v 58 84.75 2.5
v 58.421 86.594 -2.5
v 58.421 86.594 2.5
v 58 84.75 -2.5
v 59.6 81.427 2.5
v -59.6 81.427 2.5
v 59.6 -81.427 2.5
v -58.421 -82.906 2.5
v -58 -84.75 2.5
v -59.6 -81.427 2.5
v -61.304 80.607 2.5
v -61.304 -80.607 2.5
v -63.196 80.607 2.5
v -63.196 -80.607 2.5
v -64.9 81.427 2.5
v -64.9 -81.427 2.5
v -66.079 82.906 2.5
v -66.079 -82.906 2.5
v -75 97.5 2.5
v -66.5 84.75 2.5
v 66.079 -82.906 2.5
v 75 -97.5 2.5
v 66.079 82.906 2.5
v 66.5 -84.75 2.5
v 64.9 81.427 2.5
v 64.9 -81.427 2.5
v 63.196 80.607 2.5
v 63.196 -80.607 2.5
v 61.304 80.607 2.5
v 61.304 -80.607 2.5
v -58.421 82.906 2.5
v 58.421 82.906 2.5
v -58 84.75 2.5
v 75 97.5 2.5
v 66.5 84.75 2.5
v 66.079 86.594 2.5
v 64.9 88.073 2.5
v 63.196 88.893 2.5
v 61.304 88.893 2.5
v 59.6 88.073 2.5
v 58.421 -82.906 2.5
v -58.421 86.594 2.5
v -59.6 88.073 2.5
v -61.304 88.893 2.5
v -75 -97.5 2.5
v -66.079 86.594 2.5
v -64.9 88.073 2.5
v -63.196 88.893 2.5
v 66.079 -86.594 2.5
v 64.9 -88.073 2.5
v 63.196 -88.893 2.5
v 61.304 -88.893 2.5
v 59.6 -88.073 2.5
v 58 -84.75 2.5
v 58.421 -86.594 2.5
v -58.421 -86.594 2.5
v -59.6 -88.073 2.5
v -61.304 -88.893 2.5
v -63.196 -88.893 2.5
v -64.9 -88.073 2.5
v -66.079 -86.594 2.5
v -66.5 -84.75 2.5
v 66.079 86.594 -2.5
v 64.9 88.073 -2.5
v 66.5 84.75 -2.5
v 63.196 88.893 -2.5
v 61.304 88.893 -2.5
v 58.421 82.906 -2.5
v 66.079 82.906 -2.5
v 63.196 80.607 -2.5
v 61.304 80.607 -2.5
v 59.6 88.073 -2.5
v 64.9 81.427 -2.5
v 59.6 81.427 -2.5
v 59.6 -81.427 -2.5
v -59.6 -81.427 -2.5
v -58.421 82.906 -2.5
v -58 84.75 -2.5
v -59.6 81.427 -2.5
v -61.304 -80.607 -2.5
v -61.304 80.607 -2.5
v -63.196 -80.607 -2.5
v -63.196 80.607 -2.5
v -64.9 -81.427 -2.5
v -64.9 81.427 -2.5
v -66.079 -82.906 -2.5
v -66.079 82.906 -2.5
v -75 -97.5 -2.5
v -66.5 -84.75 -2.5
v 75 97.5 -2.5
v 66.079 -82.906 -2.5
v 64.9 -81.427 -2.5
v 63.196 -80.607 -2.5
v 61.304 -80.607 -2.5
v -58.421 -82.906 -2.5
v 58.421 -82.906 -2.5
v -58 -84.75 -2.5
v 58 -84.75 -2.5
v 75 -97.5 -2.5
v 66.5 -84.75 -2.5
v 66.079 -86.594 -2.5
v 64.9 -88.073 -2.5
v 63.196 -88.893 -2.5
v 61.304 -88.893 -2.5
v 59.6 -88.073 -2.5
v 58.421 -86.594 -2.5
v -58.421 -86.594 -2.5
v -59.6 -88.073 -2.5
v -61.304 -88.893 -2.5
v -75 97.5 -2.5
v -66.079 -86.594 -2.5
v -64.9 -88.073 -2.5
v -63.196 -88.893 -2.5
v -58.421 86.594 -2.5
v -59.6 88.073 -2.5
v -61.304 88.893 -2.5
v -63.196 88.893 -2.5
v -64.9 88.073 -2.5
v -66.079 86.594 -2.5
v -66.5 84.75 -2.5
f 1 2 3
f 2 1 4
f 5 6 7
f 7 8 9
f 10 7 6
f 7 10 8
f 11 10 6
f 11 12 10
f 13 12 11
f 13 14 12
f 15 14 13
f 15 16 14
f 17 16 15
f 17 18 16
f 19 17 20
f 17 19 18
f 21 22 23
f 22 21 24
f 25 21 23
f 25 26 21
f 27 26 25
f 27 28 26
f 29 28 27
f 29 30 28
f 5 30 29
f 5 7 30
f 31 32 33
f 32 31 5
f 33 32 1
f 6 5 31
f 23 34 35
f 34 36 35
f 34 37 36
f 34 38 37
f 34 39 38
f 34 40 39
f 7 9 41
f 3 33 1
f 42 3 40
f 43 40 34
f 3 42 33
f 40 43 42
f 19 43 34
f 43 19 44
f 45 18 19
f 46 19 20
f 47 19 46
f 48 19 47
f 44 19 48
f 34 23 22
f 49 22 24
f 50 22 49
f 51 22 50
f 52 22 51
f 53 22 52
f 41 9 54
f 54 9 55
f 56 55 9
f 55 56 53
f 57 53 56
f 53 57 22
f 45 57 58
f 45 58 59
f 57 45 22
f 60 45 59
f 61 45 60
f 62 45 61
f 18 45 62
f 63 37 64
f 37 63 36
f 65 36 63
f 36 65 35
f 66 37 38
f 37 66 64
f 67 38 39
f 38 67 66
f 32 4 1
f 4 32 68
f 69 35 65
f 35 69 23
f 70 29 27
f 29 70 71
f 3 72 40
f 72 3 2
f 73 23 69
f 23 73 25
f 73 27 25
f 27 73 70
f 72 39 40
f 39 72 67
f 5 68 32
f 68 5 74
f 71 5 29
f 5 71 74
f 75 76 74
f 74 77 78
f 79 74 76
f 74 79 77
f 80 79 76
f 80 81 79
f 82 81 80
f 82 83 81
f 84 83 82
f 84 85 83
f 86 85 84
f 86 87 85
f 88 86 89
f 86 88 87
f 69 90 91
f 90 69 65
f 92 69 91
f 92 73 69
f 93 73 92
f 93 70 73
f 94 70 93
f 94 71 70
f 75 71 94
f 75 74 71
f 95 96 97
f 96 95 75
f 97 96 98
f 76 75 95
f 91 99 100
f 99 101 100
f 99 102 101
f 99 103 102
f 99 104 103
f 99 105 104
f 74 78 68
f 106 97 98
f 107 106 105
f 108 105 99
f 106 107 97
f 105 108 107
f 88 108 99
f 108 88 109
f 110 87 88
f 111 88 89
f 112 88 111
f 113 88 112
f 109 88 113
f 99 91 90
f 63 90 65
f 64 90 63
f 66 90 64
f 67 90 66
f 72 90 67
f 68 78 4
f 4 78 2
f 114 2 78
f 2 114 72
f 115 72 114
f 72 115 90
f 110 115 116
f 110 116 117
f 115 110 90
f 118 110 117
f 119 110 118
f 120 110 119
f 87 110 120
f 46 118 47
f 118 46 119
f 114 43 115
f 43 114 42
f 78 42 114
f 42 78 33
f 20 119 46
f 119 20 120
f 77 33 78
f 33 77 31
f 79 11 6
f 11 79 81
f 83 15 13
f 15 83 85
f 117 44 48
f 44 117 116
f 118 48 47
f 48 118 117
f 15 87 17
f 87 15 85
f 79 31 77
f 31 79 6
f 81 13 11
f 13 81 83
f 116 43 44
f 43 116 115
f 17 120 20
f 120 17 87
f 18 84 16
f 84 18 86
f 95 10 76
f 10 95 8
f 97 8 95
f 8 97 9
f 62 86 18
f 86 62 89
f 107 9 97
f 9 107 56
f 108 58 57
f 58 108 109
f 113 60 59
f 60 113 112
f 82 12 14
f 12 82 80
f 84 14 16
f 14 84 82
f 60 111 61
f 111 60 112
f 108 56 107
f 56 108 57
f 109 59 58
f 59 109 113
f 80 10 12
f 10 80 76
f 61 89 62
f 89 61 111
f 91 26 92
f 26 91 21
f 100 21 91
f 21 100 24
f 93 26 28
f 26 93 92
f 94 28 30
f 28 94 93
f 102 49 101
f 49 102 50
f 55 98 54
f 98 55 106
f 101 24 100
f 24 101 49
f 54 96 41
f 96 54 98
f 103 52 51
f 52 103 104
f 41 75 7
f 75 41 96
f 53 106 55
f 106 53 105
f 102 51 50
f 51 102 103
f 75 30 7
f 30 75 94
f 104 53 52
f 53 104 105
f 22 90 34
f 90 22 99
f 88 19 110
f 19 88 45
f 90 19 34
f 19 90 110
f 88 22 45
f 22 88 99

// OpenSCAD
// Generated by SolidPython 1.1.3 on 2024-07-25 13:19:41


difference() {
	cube(center = true, size = [150, 195.0000000000, 5]);
	union() {
		translate(v = [62.2500000000, 84.7500000000]) {
			cylinder(center = true, h = 5, r = 4.2500000000);
		}
		translate(v = [-62.2500000000, 84.7500000000]) {
			cylinder(center = true, h = 5, r = 4.2500000000);
		}
		translate(v = [-62.2500000000, -84.7500000000]) {
			cylinder(center = true, h = 5, r = 4.2500000000);
		}
		translate(v = [62.2500000000, -84.7500000000]) {
			cylinder(center = true, h = 5, r = 4.2500000000);
		}
	}
}
/***********************************************
*********      SolidPython code:      **********
************************************************
 
import solid
import numpy as np
import numbers
import pudb
from solid.utils import *
import viewscad
import subprocess
import os
import os.path as osp
import math
import sys

chamfer_extrude=solid.import_scad("./chamfer_extrude.scad")
chamfer_extrude=chamfer_extrude.chamfer_extrude
r = viewscad.Renderer(width=800, height=800)

def debug(model,f_name,path="/home/ts/code/projects/mfd/designs/debug"):
    solid.scad_render_to_file(model,osp.join(path,f_name)+".scad")
#generate position list of wells using offset from center
wells_pos_from_center_4 = lambda offset: [[-offset,offset],
                                        [offset, offset],
                                        [-offset, -offset],
                                        [offset, -offset]]
wells_pos_from_center_2 = lambda offset: [[offset,0],
                                        [-offset,0]]

def make_well(dims,shape=None,height=None,dxf=False):
    def circle_cylinder():
        if dxf or (height is None):
            well = solid.circle(r=dims, segments=64)
        else:
            well = solid.cylinder(r=dims, h=height, segments=64, center = True)
        return well
    if dims is None:
        sys.exit("radius needs to be a number")
    if isinstance(dims, numbers.Number):
        well =circle_cylinder()
    elif len(dims)==1:
        if isinstance(dims[1], numbers.Number):
            well =circle_cylinder()
        else:
            sys.exit("radius needs to be a number")
    elif len(dims)==2:
        well = solid.square(dims,center = True)
    elif len(dims)==3:
        well = solid.cube(dims, center = True)
    return well

def wells_top_bottom(center_gap,device_dims=None,shape=None,height=None, positions = None, dxf = False,well_shape=None):
    if well_shape == None:
        well_shape = make_well(device_dims,shape=shape,height=height,dxf=dxf)
    wells = []
    if positions is None:
        offset = radius+radius/2.0
        positions = wells_pos_from_center_2(offset)
    if dxf or (height is None):
        height = 0
    for position in positions:
        if dxf:
            wells.append(solid.translate([position[0],position[1]])(well_shape))
        else:
            wells.append(solid.translate([position[0],position[1],height/2.0])(well_shape))
    return  union()(*wells)

#place wells in four corners 
def four_corner(radius,height=None, positions = None, dxf = False):
    #if well pos not specified set
    #to equally spaced by half radius
    if positions is None:
        offset = radius+radius/2.0
        positions = wells_pos_from_center_4(offset)
    if dxf or (height is None):
        height = 0
    #make wells at positions with specified radius and height
    wells = []
    for position in positions:
        #make circle if making dxf
        if dxf:
            well_shape = solid.circle(r=radius, segments=64)
            well_shape = solid.translate([position[0],position[1]])(well_shape)
        #if stl make cylinder
        else:
            well_shape = solid.cylinder(r=radius, h=height, segments=64, center = True)
            well_shape = solid.translate([position[0],position[1],height/2.0])(well_shape)
        wells.append(well_shape)
    return  union()(*wells)

#generate channels 
def make_channels(length,width,height=0,num_chans=1,max_chans=None,spacing=None, dxf = False,
                  rotate_channels=False):
    if dxf or (height is None):
        height = 0
    #if channel gap not defined, is equal to
    if spacing is None: spacing = width
    #calculate number of channels if fitting max num within given width
    if not max_chans is None:
        import math
        num_chans = math.floor((max_chans-spacing)/(width+spacing))
    #get total width of channel section  
    total_width = (width*num_chans)+(spacing*(num_chans-1))

    #make template channel
    #if rotate_channels: width, length = length, width
    if dxf:
        channel_t = solid.square([length,width],center = True)
    else:
        channel_t = solid.cube([length,width,height], center = True)

    #if number channels is even, offset the first channel to center its gap
    if num_chans % 2 == 0: centering = -(width/2.0+spacing/2.0)
    else: centering = 0
    #move template channel up to align bottom at z = 0 
    #and offset center if necessary
    if dxf:
        channel_t = solid.translate([0,centering])(channel_t)
    else:
        channel_t = solid.translate([0,centering,height/2.0])(channel_t)

    #if rotate_channels: length,width = width,length
    #start making the channels
    channels = []
    for i in range(num_chans):
        #if i=0 there is no translation
        #if i=1, we make the first channel adjacent to second
        direction = i

        #if i>=1, we add channels alternating left and right
        if i >= 1:
            direction = -(i/2.0)
            if i % 2 == 1: direction = (-direction)+0.5
                
        #make channel at right position and add it to channel list
        translation_coords = [0,direction*(width+spacing)]
        #if rotate_channels: translation_coords = [direction*(width+spacing),0]
        if dxf:
            channel = solid.translate(translation_coords)(channel_t)
        else:
            channel = solid.translate([*translation_coords,0])(channel_t)
        channels.append(channel)
    
    #group all channels as one object
    channels = union()(*channels)
    #compute the x,y,z dimensions in order to pass as arguments 
    #for construction of other parts of device (such as the chambers)
    measurements = {'x':(length/2.0,-length/2.0),
                    'y':(total_width/2.0,-total_width/2.0)}
    if not dxf:
        measurements['z'] = (height,0)
    if rotate_channels:
        channels = solid.rotate(90)(channels)
        measurements['x'],measurements['y']=measurements['y'],measurements['x']
    return channels,measurements

def make_chambers(msrs,height=None,extra=0,len_until=None,width=None, dxf = False):
    #computes x,y,z length
    total = lambda x : abs(x[0]) + abs(x[1])
    
    #if specific height if specified
    #otherwise use same height as channels
    if dxf:
        pass
    elif not height is None:
        msrs['z'] = (height,0)
    else:
        msrs['z'] = (0,0)
        
    #make copy of measurements from channels to modify chamber dimensions 
    #and add length to chambers as specified
    chamber_dims = msrs.copy()
    #calculate length of chamber to reach specified offset
    if not len_until is None:
        chamber_len = len_until-(msrs['x'][0])
    #or add specified length to channel length (if not specified, adds 0)
    else:
        chamber_len = msrs['x'][0]+extra
    #set the chamber length based 
    chamber_dims['x'] = (chamber_len/2.0,-(chamber_len/2.0))
    #compute final dimensions of chamber
    if not width is None:
        chamber_dims['y'] = (width/2.0,-width/2.0)
    chamber_dims = [total(size) for size in chamber_dims.values()]
        
    #calculate chamber translation offset to place adjacent to channels
    chamber_trslt = msrs['x'][0]+(chamber_len/2.0)
    #compute chamber translation coordinates to align with channels
    #x = 1 moves chamber above channels
    #x = -1 moves chamber below channels
    if dxf:
        trslt = lambda x : [x*(chamber_trslt),0]
    else:
        trslt = lambda x : [x*(chamber_trslt),0,msrs['z'][0]/2.0]
    
    #function to make chamber at top or at bottom 
    if dxf:
        move = lambda x : solid.translate(trslt(x))(solid.square(chamber_dims, center = True) )
    else:
        move = lambda x : solid.translate(trslt(x))(solid.cube(chamber_dims,center = True))
    #make top and bottom chambers and return them as grouped
    top = move(1)
    bottom = move(-1)
    #chambers=solid.rotate(90)(solid.union()(top,bottom))
    chambers=(solid.union()(top,bottom))

    return chambers

#create alignment features 
def alignment_features(unit,dims,grid_size, mask_size = None, alignment = "hollow", units_from_center = (2.5,2.5), corner_len=None):
    width = grid_size[0]*dims[0]
    length = grid_size[1]*dims[1]
    if mask_size is None and corner_len is None:
        corner_len = (dims[0] + dims[1]) /2 / 8
    corner = lambda thickness_div : solid.union()( solid.square([corner_len,corner_len/thickness_div],center=False), solid.square([corner_len/thickness_div,corner_len],center=False) )
    
    def make_full(thickness_div):
        thickness = corner_len/thickness_div
        tr = solid.translate([0, 0, 0 ])(solid.rotate(180)(corner(thickness_div)))
        tr = solid.translate([thickness/2,thickness/2,0])(tr)
        bl = solid.translate([0, 0, 0 ])(solid.rotate(0)(corner(thickness_div)))
        bl = solid.translate([-thickness/2,-thickness/2,0])(bl)
        return solid.union()(tr,bl)
    
    def make_hollow(thickness_div):
        thickness = corner_len/(thickness_div/2)
        inner = make_full(thickness_div)
        outer = make_full(thickness_div/2)
        hollow = outer - inner 
        return hollow
    
    center = (width /2 , length/2)
    mask_pos = lambda x,y : (center[0] + x*(float(units_from_center[0])*dims[0]), center[1] + y*(float(units_from_center[1])*dims[1]))
    positions = []
    positions.append(mask_pos(1,0))
    positions.append(mask_pos(0,1))
    positions.append(mask_pos(-1,0))
    positions.append(mask_pos(0,-1))
    make_mask = lambda mtype : make_hollow(8) if mtype == "hollow" else make_full(8)
    masks = [ solid.translate([*position,0])(make_mask(alignment)) for position in positions]
    
    solid.scad_render_to_file(solid.union()(*masks),"./designs/open_chamber/masks.scad")
    #return unit - solid.union()(*masks)
    return solid.union()(*masks,unit)

def create_outline(thickness, array, dims, grid_size,):
    width = grid_size[0]*dims[0] + thickness *2
    length = grid_size[1]*dims[1] + thickness *2
    outer = solid.translate([-thickness, -thickness,0])(solid.square([width, length]))
    return outer-array

def create_wall(wall_thickness, outline_thickness, dims, grid_size, wall_height = 2000, dxf = False):
    inner_width = grid_size[0]*dims[0] + outline_thickness *2
    inner_length = grid_size[1]*dims[1] + outline_thickness *2
    outer_width = inner_width + wall_thickness * 2
    outer_length = inner_length + wall_thickness * 2
    outer_pos_x = -outline_thickness-wall_thickness
    outer_pos_y = -outline_thickness-wall_thickness
    inner_pos_x = -outline_thickness
    inner_pos_y = -outline_thickness
    if dxf:
        inner_wall = solid.translate([inner_pos_x,
                                      inner_pos_y,
                                      0])(solid.square([inner_width, inner_length]))
        outer_wall = solid.translate([outer_pos_x,
                                      outer_pos_y,
                                      0])(solid.square([outer_width, outer_length]))

        return outer_wall-inner_wall
    else:
        inner_wall = solid.translate([inner_pos_x,
                                      inner_pos_y,
                                      0])(solid.cube([inner_width, inner_length,wall_height]))
        outer_wall = solid.translate([outer_pos_x,
                                      outer_pos_y,
                                      0])(solid.cube([outer_width, outer_length,wall_height]))

        return outer_wall-inner_wall, {'wall_height': wall_height,
                                       'wall_thickness': wall_thickness,
                                       'inner_width':inner_width,
                                       'inner_length': inner_length,
                                       'outer_width': outer_width,
                                       'outer_length': outer_length,
                                       'outer_pos_x' : outer_pos_x,
                                       'outer_pos_y' : outer_pos_y,
                                       'inner_pos_x' : inner_pos_x,
                                       'inner_pos_y' : inner_pos_y}

def create_thicker_wall(wall_thickness, outer_wall_offset, wall_dims, dims, grid_size, height_start = .2, height_end=2, dxf = False):
    addon_wall,thicker_wall_dims = create_wall(wall_thickness, outer_wall_offset, dims, grid_size, wall_height=height_end-height_start, dxf = False)
    addon_wall = solid.translate([0,0,height_start])(addon_wall)

    thicker_wall_dims['wall_height'] = height_end
    thicker_wall_dims['wall_thickness'] = wall_dims['wall_thickness'] + wall_thickness
    return addon_wall, thicker_wall_dims
 
def add_lock_to_wall(wall,wall_dims,y_offset = 0,cut_ratio=0.7,L_length=3, gap_ratio=0.05, axis="x",width_ratio=1/2):
    # Makes L shape
    def make_L(max_length,length_thickness,max_width,width_thickness,height,y_offset):
        length = solid.cube([max_length,length_thickness,height])
        width = solid.cube([width_thickness,max_width,height])
        width = solid.translate([max_length-(width_thickness),0,0])(width)
        L = solid.union()(width,length)
        debug(L,"L")
        if axis == "x":
            L = solid.rotate(-90)(L)
            L = solid.translate([0,max_length,0])(L)
        else:
            L = solid.rotate(-180)(L)
            L = solid.translate([max_length,max_width,0])(L)
        return solid.translate([0,0,y_offset])(L)
    
    lock_length = L_length
    lock_width = wall_dims['wall_thickness']*width_ratio
    lock_length_thickness = lock_width/2
    lock_width_thickness = lock_width/2
    L_lock = make_L(lock_length,lock_length_thickness,lock_width,lock_width_thickness, wall_dims['wall_height']-y_offset, y_offset)
    
    margin_space = lock_length - lock_length*(1-gap_ratio)
    key_length = lock_length-margin_space
    key_length_thickness = lock_length_thickness-(margin_space*2)
    key_width = lock_width-(margin_space*2)
    key_width_thickness = lock_width_thickness-(margin_space*2)
    L_key = make_L(key_length,key_length_thickness,key_width,key_width_thickness, wall_dims['wall_height']-y_offset, y_offset)
    L_key = solid.translate([margin_space,margin_space,0])(L_key)
    L = solid.union()(L_lock,L_key)
    debug(L,"L")
    
    #Make cube to be used as negative to split frame in a half
    #Can choose if making left or right negative, specify ratio of split
    def make_negative(right,cut_ratio):
        if axis == "x":
            if right:
                length = wall_dims['outer_length']*(1-cut_ratio)
                pos_x = wall_dims['outer_pos_x']+(wall_dims['outer_length']*cut_ratio)
            else:
                length = wall_dims['outer_length']*(cut_ratio)
                pos_x = wall_dims['outer_pos_x'] 
            negative = solid.cube([wall_dims['outer_width'],length, wall_dims['wall_height']])
            negative = solid.translate([wall_dims['outer_pos_y'],pos_x,0])(negative)
        else:
            if right:
                length = wall_dims['outer_width']*(1-cut_ratio)
                pos_x = wall_dims['outer_pos_y']+(wall_dims['outer_width']*cut_ratio)
            else:
                length = wall_dims['outer_width']*(cut_ratio)
                pos_x = wall_dims['outer_pos_y'] 
            negative = solid.cube([length,wall_dims['outer_length'], wall_dims['wall_height']])
            negative = solid.translate([pos_x,wall_dims['outer_pos_x'],0])(negative)
        return negative, pos_x, length 
                      
    #Make negatives
    negative_right, right_half_pos_x, right_half_length = make_negative(True,cut_ratio)
    negative_left, left_half_pos_x, right_half_length = make_negative(False,cut_ratio)
    #Make halves
    left_half = solid.difference()(wall,negative_right)
    right_half = solid.difference()(wall,negative_left)
    def place_L(L, L_length,L_width):
        #Place L on top wall       
        offset_to_center = (wall_dims['wall_thickness']-L_width)/2
        if axis == "x":
            y_pos_top = (wall_dims['outer_pos_y'] +
                    wall_dims['outer_width'] - 
                    L_width - offset_to_center)
            top_L = solid.translate([y_pos_top,
                                     right_half_pos_x-(L_length),
                                     0])(L)
            #Place L on bottom wall       
            y_pos_bottom = wall_dims['outer_pos_y']+offset_to_center
            bottom_L = solid.translate([y_pos_bottom,
                                        right_half_pos_x-L_length,
                                        0])(L)
        else:
            y_pos_top = (wall_dims['outer_pos_x'] +
                    wall_dims['outer_length'] -
                    (L_width+offset_to_center))
            top_L = solid.translate([right_half_pos_x-L_length,
                                     y_pos_top,
                                     0])(L)
            #Place L on bottom wall       
            y_pos_bottom = wall_dims['outer_pos_y']+offset_to_center
            bottom_L = solid.translate([right_half_pos_x-L_length,
                                        y_pos_bottom,
                                        0])(L)
        return bottom_L, top_L
    #Make complimentary L pieces through union and differences
    #Make Lock
    bottom_L_lock, top_L_lock = place_L(L_lock,L_length,lock_width)
    left_half = solid.difference()(left_half,bottom_L_lock)
    left_half = solid.difference()(left_half,top_L_lock)
    #Make Key
    bottom_L_key, top_L_key = place_L(L_key,L_length,lock_width)
    right_half = solid.union()(right_half,bottom_L_key)
    right_half = solid.union()(right_half,top_L_key)
    return left_half, right_half


#build a row x col grid of containment units
def make_unit_array(unit,dims,grid_size, dxf = False, alignment = None, mask_size = None,
                    units_from_center = None,alignment_offset=None, alignment_mark_size=1):
    units = []
    for col in range(grid_size[1]):
        for row in range(grid_size[0]):
            if dxf:
                units.append(solid.translate([row*dims[0],col*dims[1]])(unit))
            else:
                units.append(solid.translate([row*dims[0],col*dims[1],dims[2]/2.0])(unit))
    array = solid.union()(*units)
    if (not alignment is None) and dxf:
        if not alignment_offset is None:
            array = solid.translate([alignment_offset[0],alignment_offset[1]])(array)
        array = alignment_features(array,dims, grid_size, alignment = alignment, mask_size = None, units_from_center = units_from_center,corner_len=alignment_mark_size)
        if not alignment_offset is None:
            array = solid.translate([-alignment_offset[0],-alignment_offset[1]])(array)
    return array


def make_taylor(wells_pos = wells_pos_from_center_4(2.25), well_rad = 1.5 ,
                well_height = 2, chan_w = 0.01, chan_l = 1, chan_h = 0.010 ,
                chan_gap = 0.040, max_chans = None,num_chans=100, chamber_height  = 0.100,
                columns = 1, rows = 1, chamber_len_until=2.25, add_channels = True, add_wells = True, 
                add_chambers = True, save_path = "./", alignment = None, units_from_center = 2,
                mask_size = None, render_stl = False, outline_thickness = 0.050, dxf = True,
                wall_height = 15, wall_thickness = 0.95, casing_x=9, casing_y=9, casing_z=0,rotate_units=0):

    dims = [casing_x, casing_y, casing_z]
    wells = four_corner(well_rad,well_height, dxf = dxf, positions = wells_pos)
    debug(wells,"wells")
    channels, msrs = make_channels(chan_l,chan_w,chan_h,dxf=dxf, spacing = chan_gap, max_chans=max_chans,num_chans=num_chans)
    debug(channels,"channels")
    chambers = make_chambers(msrs,dxf = dxf, height=chamber_height,len_until=chamber_len_until)
    debug(chambers,"chambers")

    #add together and render
    device_parts = []
    if add_channels:
        device_parts.append(channels)
    if add_wells:
        device_parts.append(wells)
    if add_chambers:
        device_parts.append(chambers)
    device=union()(*device_parts)
    device = rotate(rotate_units)(device)

    device=solid.translate([dims[0]/2.0,dims[1]/2.0,0])(device)
    channels = rotate(rotate_units)(channels)
    channels=solid.translate([dims[0]/2,dims[1]/2,0])(channels)
    chambers_wells = union()(wells,chambers)
    chambers_wells = rotate(rotate_units)(chambers_wells)
    chambers_wells=solid.translate([dims[0]/2,dims[1]/2,0])(chambers_wells)

    file_name = str(rows)+'x'+str(columns)+'_units_'
    grid_size = [rows,columns]

    if alignment:
        alignment="full"
    device = make_unit_array(device,dims,grid_size, dxf=dxf, alignment = alignment,
                                 units_from_center = units_from_center)
    channels = make_unit_array(channels,dims,grid_size, dxf=dxf, alignment = alignment,
                                 units_from_center = units_from_center)
    if alignment=="full":
        alignment="hollow"

    chambers_wells = make_unit_array(chambers_wells,dims,grid_size, dxf=dxf, alignment = alignment,
                                 units_from_center =units_from_center)

    def save_model(model,prefix):
        model_fname = os.path.abspath(save_path+prefix+"_"+file_name+".scad")
        solid.scad_render_to_file(model,model_fname)
        return model_fname

    wells_fname = save_model(wells,"wells")
    channels_fname = save_model(channels,"channels")
    device_fname = save_model(device,"device")
    chambers_wells_fname = save_model(chambers_wells,"chambers_wells")
    return (chambers_wells,chambers_wells_fname), (channels,channels_fname), (device,device_fname)

def make_device(design='open',rows=8,columns=6,wells_pos = 4.5,well_offset=3.2, well_rad=3.2,well_height=0.1,
                chan_l=1,chan_w=0.01,chan_h=0.01,chan_gap=0.015,num_chans=101,dxf=True,save_path="./designs/open_chamber/",
                casing_x=9.0,casing_y=18.0,casing_z=0,rotate_units=90,units_from_center=(3,1),chamber_len_until=4.5,
                chamber_width=None,alignment=True, add_wells=True, add_channels=True,add_chambers=True,well_shape=None):

    dims = [casing_x, casing_y, casing_z]
    if design == "open":
        wells_pos=wells_pos_from_center_2(wells_pos)
        wells = wells_top_bottom(well_offset*2,device_dims=well_rad,height=well_height, dxf = dxf, positions = wells_pos,well_shape=well_shape)
    elif design == "closed":
        wells_pos=wells_pos_from_center_4(wells_pos)
        debug(wells,"wells")
        wells = four_corner(well_offset,well_height,device_dims=well_rad, dxf = dxf, positions = wells_pos)
    else:
        print(design+" is not a valid design.\n Choose valid design: 'open' or 'closed'")
        exit()
    wells = rotate(rotate_units)(wells)
    wells=solid.translate([dims[0]/2,dims[1]/2,0])(wells)
    debug(wells,"wells")

    channels, msrs = make_channels(chan_l,chan_w,chan_h,dxf=dxf, spacing = chan_gap, num_chans=num_chans,rotate_channels=False)
    channels = rotate(rotate_units)(channels)
    channels=solid.translate([dims[0]/2,dims[1]/2,0])(channels)

    chambers=make_chambers(msrs,height=None,extra=0,len_until=chamber_len_until, width=chamber_width,dxf = dxf)
    chambers = rotate(rotate_units)(chambers)
    chambers=solid.translate([dims[0]/2,dims[1]/2,0])(chambers)

    device_parts = []
    if add_channels:
        device_parts.append(channels)
    if add_wells:
        device_parts.append(wells)
    if add_chambers:
        device_parts.append(chambers)
    device = union()(*device_parts)
    #device = rotate(rotate_units)(device)
    #device=solid.translate([dims[0]/2.0,dims[1]/2.0,0])(device)

    chambers_wells = []
    if add_chambers:
        chambers_wells.append(chambers)
    if add_wells:
        chambers_wells.append(wells)
    chambers_wells = union()(*chambers_wells)
    #chambers_wells = union()(wells,chambers)
    #chambers_wells = rotate(rotate_units)(chambers_wells)
    #chambers_wells=solid.translate([dims[0]/2,dims[1]/2,0])(chambers_wells)

    file_name = str(rows)+'x'+str(columns)+'_units_'

    grid_size = [rows,columns]
    if alignment:
        alignment="full"
    device = make_unit_array(device,dims,grid_size, dxf=dxf, alignment = alignment,
                                 units_from_center = units_from_center)
    channels = make_unit_array(channels,dims,grid_size, dxf=dxf, alignment = alignment,
                                 units_from_center = units_from_center)
    if alignment=="full":
        alignment="hollow"

    chambers_wells = make_unit_array(chambers_wells,dims,grid_size, dxf=dxf, alignment = alignment,
                                 units_from_center =units_from_center)

    def save_model(model,prefix):
        model_fname = os.path.abspath(save_path+prefix+"_"+file_name+".scad")
        solid.scad_render_to_file(model,model_fname)
        return model_fname

    wells_fname = save_model(wells,"wells")
    channels_fname = save_model(channels,"channels")
    device_fname = save_model(device,"device")
    chambers_wells_fname = save_model(chambers_wells,"chambers_wells")
    return (chambers_wells,chambers_wells_fname), (channels,channels_fname), (device,device_fname)


def make_open_chamber(rows=8,columns=6,wells_pos = wells_pos_from_center_2(4.5), well_rad=3.2,well_height=0.1,
                      chan_l=1,chan_w=0.01,chan_h=0.01,chan_gap=0.015,num_chans=101,dxf=True,save_path="./designs/open_chamber/",
                      casing_x=9.0,casing_y=18.0,casing_z=0,rotate_units=90,units_from_center=(3,1),chamber_len_until=4.5,
                      chamber_width=None,alignment=True, add_wells=True, add_channels=True,add_chambers=True,well_shape=None):

    dims = [casing_x, casing_y, casing_z]
    wells = wells_top_bottom(well_rad,height=well_height, dxf = dxf, positions = wells_pos, well_shape=well_shape)
    channels, msrs = make_channels(chan_l,chan_w,chan_h,dxf=dxf, spacing = chan_gap, num_chans=num_chans,rotate_channels=False)
    chambers=make_chambers(msrs,height=None,extra=0,len_until=chamber_len_until, width=chamber_width,dxf = dxf)
    debug(chambers,"chambers")
    device_parts = []
    if add_channels:
        device_parts.append(channels)
    if add_wells:
        device_parts.append(wells)
    if add_chambers:
        device_parts.append(chambers)
    device = union()(*device_parts)
    device = rotate(rotate_units)(device)
    device=solid.translate([dims[0]/2.0,dims[1]/2.0,0])(device)
    channels = rotate(rotate_units)(channels)
    channels=solid.translate([dims[0]/2,dims[1]/2,0])(channels)
    chambers_wells = union()(wells,chambers)
    chambers_wells = rotate(rotate_units)(chambers_wells)
    chambers_wells=solid.translate([dims[0]/2,dims[1]/2,0])(chambers_wells)

    file_name = str(rows)+'x'+str(columns)+'_units_'

    grid_size = [rows,columns]
    if alignment:
        alignment="full"
    device = make_unit_array(device,dims,grid_size, dxf=dxf, alignment = alignment,
                                 units_from_center = units_from_center)
    channels = make_unit_array(channels,dims,grid_size, dxf=dxf, alignment = alignment,
                                 units_from_center = units_from_center)
    if alignment=="full":
        alignment="hollow"

    chambers_wells = make_unit_array(chambers_wells,dims,grid_size, dxf=dxf, alignment = alignment,
                                 units_from_center =units_from_center)

    def save_model(model,prefix):
        model_fname = os.path.abspath(save_path+prefix+"_"+file_name+".scad")
        solid.scad_render_to_file(model,model_fname)
        return model_fname

    wells_fname = save_model(wells,"wells")
    channels_fname = save_model(channels,"channels")
    device_fname = save_model(device,"device")
    chambers_wells_fname = save_model(chambers_wells,"chambers_wells")
    return (chambers_wells,chambers_wells_fname), (channels,channels_fname), (device,device_fname)

def to_dxf(scad_path):
    dxf_path = scad_path.replace(".scad",".dxf")
    subprocess.call(["openscad", "-o", dxf_path, scad_path])
    import ezdxf
    temp_dxf = ezdxf.readfile(dxf_path)
    temp_dxf.saveas(dxf_path)

#def make_walls(diameter,thickness,grid_size,dims,height=20,segments=256,make_inner=True):
#    wafer_wall_out = solid.cylinder(r=diameter/2,h=height, segments=segments)
#    wafer_wall_in = solid.cylinder(r=(diameter/2-thickness),h=height, segments=segments)
#    wafer_wall = solid.difference()(wafer_wall_out,wafer_wall_in)
#    wafer_wall = solid.translate([grid_size[1]*dims[1]/2.0,grid_size[0]*dims[0]/2.0])(wafer_wall)
#
#    vertical_wall_length = grid_size[1]*dims[1]
#    horizontal_wall_length = grid_size[0]*dims[0]
#    vertical_wall = solid.cube([vertical_wall_length,thickness,height],center = True)
#    vertical_wall = solid.translate([vertical_wall_length/2,0,height/2])(vertical_wall)
#    horizontal_wall = solid.cube([thickness,horizontal_wall_length,height],center = True)
#    horizontal_wall = solid.translate([0,vertical_wall_length/2,height/2])(horizontal_wall)
#    walls = []
#    walls.append(horizontal_wall)
#    walls.append(vertical_wall)
#    for col in range(grid_size[1]):
#        if col == grid_size[1]-1: 
#            walls.append(solid.translate([0,(col+1)*dims[1]])(vertical_wall))
#        elif col > 0 and col < grid_size[1]-1 and make_inner==True:
#            walls.append(solid.translate([0,(col+1)*dims[1]])(vertical_wall))
#    for row in range(grid_size[0]):
#        if row == grid_size[0]-1: 
#            walls.append(solid.translate([(row+1)*dims[0],0])(horizontal_wall))
#        elif row > 0 and row < grid_size[0]-1 and make_inner==True:
#            walls.append(solid.translate([(row+1)*dims[0],0])(horizontal_wall))
#    walls = union()(*walls)
#    wafer_walls = union()(walls,wafer_wall)
#    return walls,wafer_wall,wafer_walls

def make_walls(diameter,thickness,grid_size,dims,height=20,segments=256,make_inner=True,padx=0,pady=0):
    wafer_wall_out = solid.cylinder(r=diameter/2,h=height, segments=segments)
    wafer_wall_in = solid.cylinder(r=(diameter/2-thickness),h=height, segments=segments)
    wafer_wall = solid.difference()(wafer_wall_out,wafer_wall_in)
    wafer_wall = solid.translate([grid_size[1]*dims[1]/2.0,grid_size[0]*dims[0]/2.0])(wafer_wall)

    vertical_wall_length = grid_size[0]*dims[0]+padx
    horizontal_wall_length = grid_size[1]*dims[1]+pady
    vertical_wall = solid.cube([vertical_wall_length,thickness,height],center = True)
    vertical_wall = solid.translate([vertical_wall_length/2-pady/2,-padx/2,height/2])(vertical_wall)
    horizontal_wall = solid.cube([thickness,horizontal_wall_length,height],center = True)
    horizontal_wall = solid.translate([-pady/2,horizontal_wall_length/2-padx/2,height/2])(horizontal_wall)
    walls = []
    walls.append(horizontal_wall)
    walls.append(vertical_wall)
    for col in range(grid_size[1]):
        if col == grid_size[1]-1: 
            walls.append(solid.translate([0,(col+1)*dims[1]+pady])(vertical_wall))
        elif col > 0 and col < grid_size[1]-1 and make_inner==True:
            walls.append(solid.translate([0,(col+1)*dims[1]])(vertical_wall))
    for row in range(grid_size[0]):
        if row == grid_size[0]-1: 
            walls.append(solid.translate([(row+1)*dims[0]+padx,0])(horizontal_wall))
        elif row > 0 and row < grid_size[0]-1 and make_inner==True:
            walls.append(solid.translate([(row+1)*dims[0],0])(horizontal_wall))
    walls = union()(*walls)
    wafer_walls = union()(walls,wafer_wall)
    return walls,wafer_wall,wafer_walls

def save_model(model,base_path,base_name,dxf=True):
    if not os.path.exists(base_path):
        os.makedirs(base_path)
    dxf_path=osp.join(base_path,base_name+".scad")
    solid.scad_render_to_file(model,osp.join(dxf_path))
    if dxf:
        to_dxf(dxf_path)

def make_wafer(diameter,flat_len,thickness):
    wafer = solid.cylinder(r1=diameter/2,r2=diameter/2,h=thickness,segments=512,)()
    x_start_flat=(flat_len/2)
    y_start_flat = math.sqrt(((diameter/2)**2) - (x_start_flat**2) )
    height_delete_flat=diameter/2-y_start_flat
    flat_delete = solid.cube([flat_len,height_delete_flat,thickness],center=False)()
    flat_delete = solid.translate([-flat_len/2,y_start_flat,0])(flat_delete)
    wafer = solid.difference()(wafer,flat_delete)
    wafer = solid.rotate(90)(wafer)
    return wafer

def add_wafer_to_mask(wafer_size,flat_len,mask,grid_size,dims,wafer_line_thickness=0.1,outer_mask_thickness=5,alignment_offset=None,shrinkage_scale=1.0):
    def make_wafer_mask(wafer_size,flat_len):
        wafer_mask = make_wafer(wafer_size,flat_len,1)
        wafer_mask = solid.projection()(wafer_mask)
        wafer_mask = solid.translate(np.array([grid_size[0]*dims[0]/2.0,grid_size[1]*dims[1]/2.0])*shrinkage_scale)(wafer_mask)
        if not alignment_offset is None:
            wafer_mask = solid.translate(np.array([-alignment_offset[0],-alignment_offset[1]])*shrinkage_scale)(wafer_mask)
        return wafer_mask

    inner_wafer_line_mask = make_wafer_mask(wafer_size-wafer_line_thickness/2,flat_len)
    outer_wafer_line_mask = make_wafer_mask(wafer_size+wafer_line_thickness/2,flat_len)
    outer_wafer_mask = make_wafer_mask(wafer_size+outer_mask_thickness,flat_len)
    outer_wafer_mask = solid.difference()(outer_wafer_mask,outer_wafer_line_mask)
    wafer_mask = solid.union()(outer_wafer_mask,inner_wafer_line_mask)

    return solid.difference()(wafer_mask,mask)

def make_posts(post_shape,post_height):
    posts = solid.linear_extrude(height=post_height)(post_shape)
    return posts

def make_wafer_empty(diameter,flat_len,thickness,margin,notch_len=20,notch_height=5,oversize=1.01):
    diameter*=oversize
    flat_len*=oversize
    wafer = make_wafer(diameter,flat_len,thickness)
    holder = solid.cylinder(r1=diameter/2+margin,r2=diameter/2+margin,h=thickness,segments=512)()
    holder = solid.difference()(holder,wafer)

    x_start_flat=(flat_len/2)
    y_start_flat = math.sqrt(((diameter/2)**2) - (x_start_flat**2) )
    height_delete_flat=diameter/2-y_start_flat
    notch = solid.cube([notch_len,notch_height,thickness],center=False)()
    notch = solid.translate([-notch_len/2,y_start_flat,0])(notch)
    notch = solid.rotate(90)(notch)
    return solid.difference()(holder,notch)

def wafer_print_calibration(diameter,thickness,height,z_offset):
    circles = []
    radii = []
    radii.append(diameter/2.0*0.8)
    radii.append(diameter/2.0*0.6)
    radii.append(diameter/2.0*0.4)
    radii.append(diameter/2.0*0.2)
    for radius in radii:
        inner = solid.cylinder(r1=radius-(thickness/2.0),r2=radius-(thickness/2.0),h=thickness,segments=512,)()
        outer = solid.cylinder(r1=radius+(thickness/2.0),r2=radius+(thickness/2.0),h=thickness,segments=512,)()
        diff = solid.difference()(outer,inner)
        circles.append(diff)
    circles = solid.union()(*circles)
    circles = solid.translate([0,0,z_offset])(circles)
    return circles

def make_rack(wells,dims,grid_size,alignment_offset,rack_x,rack_y,rack_thickness,bolt_width,add_bolts=True):

    #get X and Y dimensions of gride of pipette tips
    X_len = dims[0]*grid_size[0]
    Y_len = dims[1]*grid_size[1]
    #make rack
    rack = solid.cube([rack_x,rack_y,rack_thickness],center=True)

    if add_bolts:
    #add bolt holes
        bolt_hole=solid.cylinder(r=bolt_width/2,h=rack_thickness,center=True)()
        bolt_holes = []
        bolt_holes.append(solid.translate([rack_x/2-1.5*bolt_width,rack_y/2-1.5*bolt_width])(bolt_hole))
        bolt_holes.append(solid.translate([-rack_x/2+1.5*bolt_width,rack_y/2-1.5*bolt_width])(bolt_hole))
        bolt_holes.append(solid.translate([-rack_x/2+1.5*bolt_width,-rack_y/2+1.5*bolt_width])(bolt_hole))
        bolt_holes.append(solid.translate([rack_x/2-1.5*bolt_width,-rack_y/2+1.5*bolt_width])(bolt_hole))
        bolt_holes = solid.union()(*bolt_holes)
        rack=solid.difference()(rack,bolt_holes)
    rack_support = rack

    #center rack with pipette holes
    rack = solid.translate([0,0,rack_thickness/2])(rack)
    rack = solid.translate([X_len/2,Y_len/2])(rack)
    rack = solid.translate([-alignment_offset[0],-alignment_offset[1]])(rack)
    wells = solid.linear_extrude(height=rack_thickness)(wells)
    rack = solid.difference()(rack,wells)
    return rack, rack_support

def make_pillar(wells,dims,grid_size,alignment_offset,rack_x,rack_y,pillar_height,rack_thickness,bolt_width,add_bolts=True,taper_angle=1,bolt_position_corner=1.5):

    #get X and Y dimensions of gride of pipette tips
    X_len = dims[0]*grid_size[0]
    Y_len = dims[1]*grid_size[1]
    #make rack
    rack = solid.cube([rack_x,rack_y,rack_thickness],center=True)
    
    if add_bolts:
    #add bolt holes
        bolt_hole=solid.cylinder(r=bolt_width/2,h=rack_thickness,center=True)()
        bolt_holes = []
        bolt_holes.append(solid.translate([rack_x/2-bolt_position_corner*bolt_width,rack_y/2-bolt_position_corner*bolt_width])(bolt_hole))
        bolt_holes.append(solid.translate([-rack_x/2+bolt_position_corner*bolt_width,rack_y/2-bolt_position_corner*bolt_width])(bolt_hole))
        bolt_holes.append(solid.translate([-rack_x/2+bolt_position_corner*bolt_width,-rack_y/2+bolt_position_corner*bolt_width])(bolt_hole))
        bolt_holes.append(solid.translate([rack_x/2-bolt_position_corner*bolt_width,-rack_y/2+bolt_position_corner*bolt_width])(bolt_hole))
        bolt_holes = solid.union()(*bolt_holes)
        rack=solid.difference()(rack,bolt_holes)
    rack_support = rack

    #center rack with pipette holes
    #rack = solid.translate([0,0,-rack_thickness])(rack)
    rack = solid.translate([X_len/2,Y_len/2])(rack)
    rack = solid.translate([-alignment_offset[0],-alignment_offset[1]])(rack)
    if not taper_angle == 0:
        wells=chamfer_extrude(pillar_height,taper_angle,segments=20)(wells)
    else:
        wells = solid.linear_extrude(height=pillar_height)(wells)
    rack = solid.union()(rack,wells)
    return rack, rack_support

def deg_taper_len(height,deg):
    if not deg == 0:
        return height*math.tan(math.radians(deg))
    else:
        return 0

def make_outline(inner_dims,wall_thickness,grid_size,dims,alignment_offset):
    inner_dims=np.array(inner_dims)
    inner_outline=solid.square(inner_dims,center=True)
    outer_dims=inner_dims+wall_thickness
    outer_outline=solid.square(outer_dims,center=True)
    outline=solid.difference()(outer_outline,inner_outline)
    outline=solid.translate([grid_size[0]*dims[0]/2.0,grid_size[1]*dims[1]/2.0])(outline)
    return outline

def scale_percent_pdms_heat_shrinkage(temperature):
    scale_percent=1
    if type(temperature) in (int,float):
        if 40 <= temperature <= 150:
            shrinkage = 0.0180*temperature + 0.46
            scale_percent=1+shrinkage/100.0
        else:
            temperature = None
    else:
        temperature = None
    if not temperature is None:
        text="Cure @ "+str(temperature)+"°C, "+str(scale_percent)+"% oversize compensating for shrinkage"
    else: text="Cure @ room temperature, no shrinkage compensation"
    return scale_percent,text









 
 
************************************************/
